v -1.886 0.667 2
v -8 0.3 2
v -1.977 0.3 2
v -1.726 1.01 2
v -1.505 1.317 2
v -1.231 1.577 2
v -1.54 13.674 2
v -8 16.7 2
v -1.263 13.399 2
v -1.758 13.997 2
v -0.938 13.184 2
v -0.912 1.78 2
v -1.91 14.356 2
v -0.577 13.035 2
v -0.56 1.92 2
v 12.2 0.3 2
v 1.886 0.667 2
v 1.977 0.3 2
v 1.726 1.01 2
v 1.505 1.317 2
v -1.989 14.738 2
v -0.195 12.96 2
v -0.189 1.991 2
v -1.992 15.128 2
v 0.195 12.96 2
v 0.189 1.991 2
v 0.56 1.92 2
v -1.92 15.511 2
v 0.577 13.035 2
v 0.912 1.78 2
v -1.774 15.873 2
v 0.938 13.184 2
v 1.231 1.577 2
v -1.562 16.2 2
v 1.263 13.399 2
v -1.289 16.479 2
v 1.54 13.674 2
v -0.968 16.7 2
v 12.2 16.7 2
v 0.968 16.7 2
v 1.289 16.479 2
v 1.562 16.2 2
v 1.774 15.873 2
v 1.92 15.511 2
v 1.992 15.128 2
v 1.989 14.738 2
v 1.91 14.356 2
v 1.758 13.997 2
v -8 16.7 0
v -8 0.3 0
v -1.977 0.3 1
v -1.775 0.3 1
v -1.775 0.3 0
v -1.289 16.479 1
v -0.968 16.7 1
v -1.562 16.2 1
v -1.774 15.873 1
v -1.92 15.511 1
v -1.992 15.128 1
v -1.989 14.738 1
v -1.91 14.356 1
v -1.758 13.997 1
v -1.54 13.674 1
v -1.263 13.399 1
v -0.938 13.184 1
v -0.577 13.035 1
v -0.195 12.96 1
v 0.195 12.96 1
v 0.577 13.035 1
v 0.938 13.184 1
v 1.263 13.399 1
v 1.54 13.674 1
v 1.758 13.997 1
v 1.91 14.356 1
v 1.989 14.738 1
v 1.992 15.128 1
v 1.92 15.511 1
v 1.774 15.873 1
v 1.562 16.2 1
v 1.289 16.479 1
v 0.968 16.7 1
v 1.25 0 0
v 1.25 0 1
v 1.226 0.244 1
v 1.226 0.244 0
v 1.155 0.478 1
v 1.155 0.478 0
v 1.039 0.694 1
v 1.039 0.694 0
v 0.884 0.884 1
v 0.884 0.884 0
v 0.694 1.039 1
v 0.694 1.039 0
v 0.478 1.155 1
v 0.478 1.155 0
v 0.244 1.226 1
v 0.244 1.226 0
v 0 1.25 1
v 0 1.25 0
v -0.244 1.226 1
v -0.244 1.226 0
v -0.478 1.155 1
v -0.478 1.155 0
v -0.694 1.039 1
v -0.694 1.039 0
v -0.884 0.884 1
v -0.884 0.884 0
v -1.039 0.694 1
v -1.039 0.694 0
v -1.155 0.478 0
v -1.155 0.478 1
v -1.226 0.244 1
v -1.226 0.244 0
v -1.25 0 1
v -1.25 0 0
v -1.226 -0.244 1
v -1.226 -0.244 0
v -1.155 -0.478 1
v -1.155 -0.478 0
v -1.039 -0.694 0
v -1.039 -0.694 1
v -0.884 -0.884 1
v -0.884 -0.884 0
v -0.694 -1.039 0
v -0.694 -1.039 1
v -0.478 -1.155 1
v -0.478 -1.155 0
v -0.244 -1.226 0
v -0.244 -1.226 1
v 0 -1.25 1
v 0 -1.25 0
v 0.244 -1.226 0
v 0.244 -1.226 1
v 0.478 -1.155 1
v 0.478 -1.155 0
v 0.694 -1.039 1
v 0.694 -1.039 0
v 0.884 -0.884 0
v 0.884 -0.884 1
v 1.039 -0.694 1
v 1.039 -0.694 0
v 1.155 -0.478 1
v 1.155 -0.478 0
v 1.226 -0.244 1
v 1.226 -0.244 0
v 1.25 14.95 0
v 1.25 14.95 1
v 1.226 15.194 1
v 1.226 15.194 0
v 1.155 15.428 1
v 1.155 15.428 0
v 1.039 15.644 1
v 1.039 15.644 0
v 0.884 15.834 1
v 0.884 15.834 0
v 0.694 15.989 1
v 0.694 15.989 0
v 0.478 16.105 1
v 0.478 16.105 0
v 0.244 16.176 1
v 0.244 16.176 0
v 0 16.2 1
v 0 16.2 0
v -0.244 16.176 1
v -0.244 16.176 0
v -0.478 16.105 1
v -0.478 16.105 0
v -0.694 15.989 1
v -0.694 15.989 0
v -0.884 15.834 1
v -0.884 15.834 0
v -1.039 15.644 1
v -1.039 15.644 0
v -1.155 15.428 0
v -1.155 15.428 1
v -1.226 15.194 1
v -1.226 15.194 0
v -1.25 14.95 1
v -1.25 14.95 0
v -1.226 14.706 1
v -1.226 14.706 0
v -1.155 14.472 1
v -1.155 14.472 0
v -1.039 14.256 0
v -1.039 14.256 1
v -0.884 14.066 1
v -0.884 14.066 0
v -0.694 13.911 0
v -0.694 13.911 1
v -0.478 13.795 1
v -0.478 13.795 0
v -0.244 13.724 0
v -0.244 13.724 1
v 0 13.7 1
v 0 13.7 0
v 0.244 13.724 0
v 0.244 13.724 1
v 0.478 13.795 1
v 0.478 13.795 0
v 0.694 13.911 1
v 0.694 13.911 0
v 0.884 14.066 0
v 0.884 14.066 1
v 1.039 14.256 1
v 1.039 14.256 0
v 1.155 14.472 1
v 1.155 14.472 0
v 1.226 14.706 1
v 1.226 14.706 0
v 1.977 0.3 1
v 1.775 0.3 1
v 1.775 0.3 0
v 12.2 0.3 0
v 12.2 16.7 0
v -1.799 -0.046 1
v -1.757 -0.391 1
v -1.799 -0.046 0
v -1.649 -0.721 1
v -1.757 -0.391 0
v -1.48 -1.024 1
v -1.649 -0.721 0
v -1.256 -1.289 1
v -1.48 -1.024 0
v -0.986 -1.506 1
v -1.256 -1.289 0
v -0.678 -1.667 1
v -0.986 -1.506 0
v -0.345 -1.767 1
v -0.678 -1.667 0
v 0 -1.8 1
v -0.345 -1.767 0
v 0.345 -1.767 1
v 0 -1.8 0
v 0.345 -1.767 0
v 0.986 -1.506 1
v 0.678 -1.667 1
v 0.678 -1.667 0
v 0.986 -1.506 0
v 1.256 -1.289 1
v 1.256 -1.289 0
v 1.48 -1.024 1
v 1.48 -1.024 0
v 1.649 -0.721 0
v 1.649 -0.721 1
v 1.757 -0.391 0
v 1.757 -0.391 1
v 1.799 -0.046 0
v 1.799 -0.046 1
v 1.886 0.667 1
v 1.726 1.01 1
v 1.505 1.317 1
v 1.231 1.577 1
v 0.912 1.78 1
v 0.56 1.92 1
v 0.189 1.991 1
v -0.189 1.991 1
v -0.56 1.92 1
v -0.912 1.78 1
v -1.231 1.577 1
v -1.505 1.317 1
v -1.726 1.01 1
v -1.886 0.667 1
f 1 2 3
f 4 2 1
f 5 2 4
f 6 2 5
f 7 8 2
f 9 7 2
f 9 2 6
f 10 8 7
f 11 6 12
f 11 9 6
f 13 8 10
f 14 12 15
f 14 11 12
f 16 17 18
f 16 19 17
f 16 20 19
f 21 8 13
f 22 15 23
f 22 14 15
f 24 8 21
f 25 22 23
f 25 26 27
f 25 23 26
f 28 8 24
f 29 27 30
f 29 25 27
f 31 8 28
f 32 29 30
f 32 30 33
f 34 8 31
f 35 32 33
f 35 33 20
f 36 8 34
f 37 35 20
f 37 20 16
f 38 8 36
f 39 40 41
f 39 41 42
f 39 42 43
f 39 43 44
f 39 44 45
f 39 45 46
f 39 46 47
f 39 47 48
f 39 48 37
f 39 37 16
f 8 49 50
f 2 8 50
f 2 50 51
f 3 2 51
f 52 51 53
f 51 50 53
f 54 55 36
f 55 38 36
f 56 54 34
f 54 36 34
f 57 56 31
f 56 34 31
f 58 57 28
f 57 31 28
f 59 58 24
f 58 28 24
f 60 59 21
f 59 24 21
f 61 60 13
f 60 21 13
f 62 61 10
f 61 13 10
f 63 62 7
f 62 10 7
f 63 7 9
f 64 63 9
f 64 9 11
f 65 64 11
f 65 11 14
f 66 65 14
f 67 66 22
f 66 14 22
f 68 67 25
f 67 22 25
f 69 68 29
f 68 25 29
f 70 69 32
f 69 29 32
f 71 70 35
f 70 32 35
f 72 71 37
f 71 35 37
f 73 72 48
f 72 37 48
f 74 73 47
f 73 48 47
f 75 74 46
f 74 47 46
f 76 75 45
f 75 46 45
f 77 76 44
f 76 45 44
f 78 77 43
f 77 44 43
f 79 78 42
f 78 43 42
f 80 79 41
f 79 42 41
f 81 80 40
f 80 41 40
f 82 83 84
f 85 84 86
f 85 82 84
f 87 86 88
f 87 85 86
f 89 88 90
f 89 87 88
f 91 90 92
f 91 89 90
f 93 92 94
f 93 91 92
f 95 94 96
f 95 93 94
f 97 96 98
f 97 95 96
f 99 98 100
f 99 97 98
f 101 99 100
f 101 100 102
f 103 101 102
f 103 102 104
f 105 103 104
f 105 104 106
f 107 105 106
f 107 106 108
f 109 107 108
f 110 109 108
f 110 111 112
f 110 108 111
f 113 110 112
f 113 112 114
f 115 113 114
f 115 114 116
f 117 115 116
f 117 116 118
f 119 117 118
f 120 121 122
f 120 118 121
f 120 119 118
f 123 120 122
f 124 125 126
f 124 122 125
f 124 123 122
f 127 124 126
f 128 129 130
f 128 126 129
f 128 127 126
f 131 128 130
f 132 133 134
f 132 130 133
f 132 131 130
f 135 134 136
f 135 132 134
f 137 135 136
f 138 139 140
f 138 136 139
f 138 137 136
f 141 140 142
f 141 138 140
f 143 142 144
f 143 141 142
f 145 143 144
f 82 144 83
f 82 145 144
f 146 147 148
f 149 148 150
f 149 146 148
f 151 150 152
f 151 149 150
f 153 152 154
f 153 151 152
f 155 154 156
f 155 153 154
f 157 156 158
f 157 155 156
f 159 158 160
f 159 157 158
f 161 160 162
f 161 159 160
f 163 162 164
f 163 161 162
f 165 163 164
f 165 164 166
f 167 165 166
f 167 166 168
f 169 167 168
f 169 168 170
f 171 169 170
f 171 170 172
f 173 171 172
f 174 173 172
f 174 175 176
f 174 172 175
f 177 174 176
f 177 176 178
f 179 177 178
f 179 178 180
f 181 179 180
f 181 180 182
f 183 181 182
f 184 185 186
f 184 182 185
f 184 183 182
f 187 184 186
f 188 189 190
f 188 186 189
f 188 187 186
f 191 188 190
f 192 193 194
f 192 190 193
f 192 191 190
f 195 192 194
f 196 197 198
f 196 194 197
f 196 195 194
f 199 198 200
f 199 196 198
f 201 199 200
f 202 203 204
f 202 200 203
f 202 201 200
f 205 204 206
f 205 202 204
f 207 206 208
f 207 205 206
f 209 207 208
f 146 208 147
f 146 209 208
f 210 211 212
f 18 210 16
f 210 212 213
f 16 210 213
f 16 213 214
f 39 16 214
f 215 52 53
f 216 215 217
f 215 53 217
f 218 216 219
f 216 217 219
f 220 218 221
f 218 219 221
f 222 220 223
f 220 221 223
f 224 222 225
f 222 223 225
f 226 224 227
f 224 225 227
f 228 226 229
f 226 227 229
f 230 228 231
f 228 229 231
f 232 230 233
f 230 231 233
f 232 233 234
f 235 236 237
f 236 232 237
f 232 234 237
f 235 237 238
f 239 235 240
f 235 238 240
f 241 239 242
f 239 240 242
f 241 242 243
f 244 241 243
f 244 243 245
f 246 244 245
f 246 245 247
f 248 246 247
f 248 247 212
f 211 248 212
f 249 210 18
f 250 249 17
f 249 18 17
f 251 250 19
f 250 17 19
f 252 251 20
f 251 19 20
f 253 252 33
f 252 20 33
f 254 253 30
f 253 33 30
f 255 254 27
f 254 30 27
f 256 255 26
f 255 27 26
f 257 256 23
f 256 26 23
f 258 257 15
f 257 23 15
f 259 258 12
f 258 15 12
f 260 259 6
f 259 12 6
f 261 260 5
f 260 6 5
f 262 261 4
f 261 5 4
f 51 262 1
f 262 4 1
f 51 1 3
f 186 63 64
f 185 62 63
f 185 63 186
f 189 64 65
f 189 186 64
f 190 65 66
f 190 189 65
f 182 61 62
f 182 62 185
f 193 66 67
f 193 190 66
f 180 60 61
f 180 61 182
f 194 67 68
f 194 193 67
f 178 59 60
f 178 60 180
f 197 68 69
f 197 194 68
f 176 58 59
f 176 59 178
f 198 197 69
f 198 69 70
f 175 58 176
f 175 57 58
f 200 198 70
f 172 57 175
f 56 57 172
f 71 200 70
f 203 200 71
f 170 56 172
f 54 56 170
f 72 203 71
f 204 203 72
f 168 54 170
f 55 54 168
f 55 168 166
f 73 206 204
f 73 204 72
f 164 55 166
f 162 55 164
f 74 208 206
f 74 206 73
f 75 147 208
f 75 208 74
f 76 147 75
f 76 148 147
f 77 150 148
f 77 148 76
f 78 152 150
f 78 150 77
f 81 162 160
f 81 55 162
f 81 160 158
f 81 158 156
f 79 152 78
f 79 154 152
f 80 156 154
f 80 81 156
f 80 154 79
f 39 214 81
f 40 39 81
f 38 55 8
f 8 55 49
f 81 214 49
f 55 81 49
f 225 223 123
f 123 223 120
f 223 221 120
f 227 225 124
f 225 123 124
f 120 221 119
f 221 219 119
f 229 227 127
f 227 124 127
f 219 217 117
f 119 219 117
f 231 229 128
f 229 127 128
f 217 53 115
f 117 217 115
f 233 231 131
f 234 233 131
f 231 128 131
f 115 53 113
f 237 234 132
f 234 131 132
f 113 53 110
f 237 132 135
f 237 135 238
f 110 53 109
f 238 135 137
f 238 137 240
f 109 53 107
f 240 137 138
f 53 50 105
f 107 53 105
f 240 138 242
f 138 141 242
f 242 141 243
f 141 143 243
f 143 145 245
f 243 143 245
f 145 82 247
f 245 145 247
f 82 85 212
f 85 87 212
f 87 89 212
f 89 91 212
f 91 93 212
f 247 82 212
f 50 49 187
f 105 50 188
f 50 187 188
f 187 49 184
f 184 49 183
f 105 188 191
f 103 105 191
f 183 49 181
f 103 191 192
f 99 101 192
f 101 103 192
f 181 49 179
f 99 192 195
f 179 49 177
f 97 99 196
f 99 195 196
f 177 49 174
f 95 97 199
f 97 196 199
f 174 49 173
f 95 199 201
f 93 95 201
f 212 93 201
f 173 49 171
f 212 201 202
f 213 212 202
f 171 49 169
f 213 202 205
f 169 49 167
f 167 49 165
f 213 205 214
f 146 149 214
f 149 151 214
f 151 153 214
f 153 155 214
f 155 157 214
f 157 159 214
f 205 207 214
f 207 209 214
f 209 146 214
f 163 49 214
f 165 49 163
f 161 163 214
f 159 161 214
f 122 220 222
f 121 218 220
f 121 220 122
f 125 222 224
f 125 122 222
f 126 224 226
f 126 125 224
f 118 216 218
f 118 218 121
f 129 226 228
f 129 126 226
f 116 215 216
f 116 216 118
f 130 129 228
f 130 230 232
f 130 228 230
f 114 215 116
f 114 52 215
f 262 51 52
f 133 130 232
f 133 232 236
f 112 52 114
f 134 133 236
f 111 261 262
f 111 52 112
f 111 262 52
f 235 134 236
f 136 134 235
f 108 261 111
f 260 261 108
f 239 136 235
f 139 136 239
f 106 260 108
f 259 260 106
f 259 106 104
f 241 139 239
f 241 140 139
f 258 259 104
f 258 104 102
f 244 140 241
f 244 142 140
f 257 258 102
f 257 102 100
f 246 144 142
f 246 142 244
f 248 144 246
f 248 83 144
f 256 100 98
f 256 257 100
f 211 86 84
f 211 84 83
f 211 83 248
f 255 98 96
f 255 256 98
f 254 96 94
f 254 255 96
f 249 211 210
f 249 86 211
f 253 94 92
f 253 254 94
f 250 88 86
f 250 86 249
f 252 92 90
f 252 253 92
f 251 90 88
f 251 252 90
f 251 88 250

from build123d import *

# Parameters (mm, degrees)
ESBO_O1_R                = 1.25
RESSALTO_EXTRUS_O1_DEPTH = 2
ESBO_O2_R                = 2
CORTE_EXTRUS_O1_DEPTH    = 1


with BuildPart() as part:
    # Esboço1 → Ressalto-extrusão1 (new body)
    with BuildSketch(Plane.XY):
        with BuildLine():
            Line((12.2, 16.7), (-8, 16.7))
            Line((-8, 16.7), (-8, 0.3))
            Line((-8, 0.3), (-1.774823935, 0.3))
            ThreePointArc((-1.774823935, 0.3), (0, -1.8), (1.774823935, 0.3))
            Line((1.774823935, 0.3), (12.2, 0.3))
            Line((12.2, 0.3), (12.2, 16.7))
        make_face()
        Circle(ESBO_O1_R, mode=Mode.SUBTRACT)
        with Locations((0, 14.95)):
            Circle(ESBO_O1_R, mode=Mode.SUBTRACT)
    extrude(amount=RESSALTO_EXTRUS_O1_DEPTH)

    # Esboço2 → Corte-extrusão1 (cut)
    with BuildSketch(Plane.XY.offset(2)):
        with Locations((0, 14.95)):
            Circle(ESBO_O2_R)
        Circle(ESBO_O2_R)
    extrude(amount=-CORTE_EXTRUS_O1_DEPTH, mode=Mode.SUBTRACT)


solid = part.part
